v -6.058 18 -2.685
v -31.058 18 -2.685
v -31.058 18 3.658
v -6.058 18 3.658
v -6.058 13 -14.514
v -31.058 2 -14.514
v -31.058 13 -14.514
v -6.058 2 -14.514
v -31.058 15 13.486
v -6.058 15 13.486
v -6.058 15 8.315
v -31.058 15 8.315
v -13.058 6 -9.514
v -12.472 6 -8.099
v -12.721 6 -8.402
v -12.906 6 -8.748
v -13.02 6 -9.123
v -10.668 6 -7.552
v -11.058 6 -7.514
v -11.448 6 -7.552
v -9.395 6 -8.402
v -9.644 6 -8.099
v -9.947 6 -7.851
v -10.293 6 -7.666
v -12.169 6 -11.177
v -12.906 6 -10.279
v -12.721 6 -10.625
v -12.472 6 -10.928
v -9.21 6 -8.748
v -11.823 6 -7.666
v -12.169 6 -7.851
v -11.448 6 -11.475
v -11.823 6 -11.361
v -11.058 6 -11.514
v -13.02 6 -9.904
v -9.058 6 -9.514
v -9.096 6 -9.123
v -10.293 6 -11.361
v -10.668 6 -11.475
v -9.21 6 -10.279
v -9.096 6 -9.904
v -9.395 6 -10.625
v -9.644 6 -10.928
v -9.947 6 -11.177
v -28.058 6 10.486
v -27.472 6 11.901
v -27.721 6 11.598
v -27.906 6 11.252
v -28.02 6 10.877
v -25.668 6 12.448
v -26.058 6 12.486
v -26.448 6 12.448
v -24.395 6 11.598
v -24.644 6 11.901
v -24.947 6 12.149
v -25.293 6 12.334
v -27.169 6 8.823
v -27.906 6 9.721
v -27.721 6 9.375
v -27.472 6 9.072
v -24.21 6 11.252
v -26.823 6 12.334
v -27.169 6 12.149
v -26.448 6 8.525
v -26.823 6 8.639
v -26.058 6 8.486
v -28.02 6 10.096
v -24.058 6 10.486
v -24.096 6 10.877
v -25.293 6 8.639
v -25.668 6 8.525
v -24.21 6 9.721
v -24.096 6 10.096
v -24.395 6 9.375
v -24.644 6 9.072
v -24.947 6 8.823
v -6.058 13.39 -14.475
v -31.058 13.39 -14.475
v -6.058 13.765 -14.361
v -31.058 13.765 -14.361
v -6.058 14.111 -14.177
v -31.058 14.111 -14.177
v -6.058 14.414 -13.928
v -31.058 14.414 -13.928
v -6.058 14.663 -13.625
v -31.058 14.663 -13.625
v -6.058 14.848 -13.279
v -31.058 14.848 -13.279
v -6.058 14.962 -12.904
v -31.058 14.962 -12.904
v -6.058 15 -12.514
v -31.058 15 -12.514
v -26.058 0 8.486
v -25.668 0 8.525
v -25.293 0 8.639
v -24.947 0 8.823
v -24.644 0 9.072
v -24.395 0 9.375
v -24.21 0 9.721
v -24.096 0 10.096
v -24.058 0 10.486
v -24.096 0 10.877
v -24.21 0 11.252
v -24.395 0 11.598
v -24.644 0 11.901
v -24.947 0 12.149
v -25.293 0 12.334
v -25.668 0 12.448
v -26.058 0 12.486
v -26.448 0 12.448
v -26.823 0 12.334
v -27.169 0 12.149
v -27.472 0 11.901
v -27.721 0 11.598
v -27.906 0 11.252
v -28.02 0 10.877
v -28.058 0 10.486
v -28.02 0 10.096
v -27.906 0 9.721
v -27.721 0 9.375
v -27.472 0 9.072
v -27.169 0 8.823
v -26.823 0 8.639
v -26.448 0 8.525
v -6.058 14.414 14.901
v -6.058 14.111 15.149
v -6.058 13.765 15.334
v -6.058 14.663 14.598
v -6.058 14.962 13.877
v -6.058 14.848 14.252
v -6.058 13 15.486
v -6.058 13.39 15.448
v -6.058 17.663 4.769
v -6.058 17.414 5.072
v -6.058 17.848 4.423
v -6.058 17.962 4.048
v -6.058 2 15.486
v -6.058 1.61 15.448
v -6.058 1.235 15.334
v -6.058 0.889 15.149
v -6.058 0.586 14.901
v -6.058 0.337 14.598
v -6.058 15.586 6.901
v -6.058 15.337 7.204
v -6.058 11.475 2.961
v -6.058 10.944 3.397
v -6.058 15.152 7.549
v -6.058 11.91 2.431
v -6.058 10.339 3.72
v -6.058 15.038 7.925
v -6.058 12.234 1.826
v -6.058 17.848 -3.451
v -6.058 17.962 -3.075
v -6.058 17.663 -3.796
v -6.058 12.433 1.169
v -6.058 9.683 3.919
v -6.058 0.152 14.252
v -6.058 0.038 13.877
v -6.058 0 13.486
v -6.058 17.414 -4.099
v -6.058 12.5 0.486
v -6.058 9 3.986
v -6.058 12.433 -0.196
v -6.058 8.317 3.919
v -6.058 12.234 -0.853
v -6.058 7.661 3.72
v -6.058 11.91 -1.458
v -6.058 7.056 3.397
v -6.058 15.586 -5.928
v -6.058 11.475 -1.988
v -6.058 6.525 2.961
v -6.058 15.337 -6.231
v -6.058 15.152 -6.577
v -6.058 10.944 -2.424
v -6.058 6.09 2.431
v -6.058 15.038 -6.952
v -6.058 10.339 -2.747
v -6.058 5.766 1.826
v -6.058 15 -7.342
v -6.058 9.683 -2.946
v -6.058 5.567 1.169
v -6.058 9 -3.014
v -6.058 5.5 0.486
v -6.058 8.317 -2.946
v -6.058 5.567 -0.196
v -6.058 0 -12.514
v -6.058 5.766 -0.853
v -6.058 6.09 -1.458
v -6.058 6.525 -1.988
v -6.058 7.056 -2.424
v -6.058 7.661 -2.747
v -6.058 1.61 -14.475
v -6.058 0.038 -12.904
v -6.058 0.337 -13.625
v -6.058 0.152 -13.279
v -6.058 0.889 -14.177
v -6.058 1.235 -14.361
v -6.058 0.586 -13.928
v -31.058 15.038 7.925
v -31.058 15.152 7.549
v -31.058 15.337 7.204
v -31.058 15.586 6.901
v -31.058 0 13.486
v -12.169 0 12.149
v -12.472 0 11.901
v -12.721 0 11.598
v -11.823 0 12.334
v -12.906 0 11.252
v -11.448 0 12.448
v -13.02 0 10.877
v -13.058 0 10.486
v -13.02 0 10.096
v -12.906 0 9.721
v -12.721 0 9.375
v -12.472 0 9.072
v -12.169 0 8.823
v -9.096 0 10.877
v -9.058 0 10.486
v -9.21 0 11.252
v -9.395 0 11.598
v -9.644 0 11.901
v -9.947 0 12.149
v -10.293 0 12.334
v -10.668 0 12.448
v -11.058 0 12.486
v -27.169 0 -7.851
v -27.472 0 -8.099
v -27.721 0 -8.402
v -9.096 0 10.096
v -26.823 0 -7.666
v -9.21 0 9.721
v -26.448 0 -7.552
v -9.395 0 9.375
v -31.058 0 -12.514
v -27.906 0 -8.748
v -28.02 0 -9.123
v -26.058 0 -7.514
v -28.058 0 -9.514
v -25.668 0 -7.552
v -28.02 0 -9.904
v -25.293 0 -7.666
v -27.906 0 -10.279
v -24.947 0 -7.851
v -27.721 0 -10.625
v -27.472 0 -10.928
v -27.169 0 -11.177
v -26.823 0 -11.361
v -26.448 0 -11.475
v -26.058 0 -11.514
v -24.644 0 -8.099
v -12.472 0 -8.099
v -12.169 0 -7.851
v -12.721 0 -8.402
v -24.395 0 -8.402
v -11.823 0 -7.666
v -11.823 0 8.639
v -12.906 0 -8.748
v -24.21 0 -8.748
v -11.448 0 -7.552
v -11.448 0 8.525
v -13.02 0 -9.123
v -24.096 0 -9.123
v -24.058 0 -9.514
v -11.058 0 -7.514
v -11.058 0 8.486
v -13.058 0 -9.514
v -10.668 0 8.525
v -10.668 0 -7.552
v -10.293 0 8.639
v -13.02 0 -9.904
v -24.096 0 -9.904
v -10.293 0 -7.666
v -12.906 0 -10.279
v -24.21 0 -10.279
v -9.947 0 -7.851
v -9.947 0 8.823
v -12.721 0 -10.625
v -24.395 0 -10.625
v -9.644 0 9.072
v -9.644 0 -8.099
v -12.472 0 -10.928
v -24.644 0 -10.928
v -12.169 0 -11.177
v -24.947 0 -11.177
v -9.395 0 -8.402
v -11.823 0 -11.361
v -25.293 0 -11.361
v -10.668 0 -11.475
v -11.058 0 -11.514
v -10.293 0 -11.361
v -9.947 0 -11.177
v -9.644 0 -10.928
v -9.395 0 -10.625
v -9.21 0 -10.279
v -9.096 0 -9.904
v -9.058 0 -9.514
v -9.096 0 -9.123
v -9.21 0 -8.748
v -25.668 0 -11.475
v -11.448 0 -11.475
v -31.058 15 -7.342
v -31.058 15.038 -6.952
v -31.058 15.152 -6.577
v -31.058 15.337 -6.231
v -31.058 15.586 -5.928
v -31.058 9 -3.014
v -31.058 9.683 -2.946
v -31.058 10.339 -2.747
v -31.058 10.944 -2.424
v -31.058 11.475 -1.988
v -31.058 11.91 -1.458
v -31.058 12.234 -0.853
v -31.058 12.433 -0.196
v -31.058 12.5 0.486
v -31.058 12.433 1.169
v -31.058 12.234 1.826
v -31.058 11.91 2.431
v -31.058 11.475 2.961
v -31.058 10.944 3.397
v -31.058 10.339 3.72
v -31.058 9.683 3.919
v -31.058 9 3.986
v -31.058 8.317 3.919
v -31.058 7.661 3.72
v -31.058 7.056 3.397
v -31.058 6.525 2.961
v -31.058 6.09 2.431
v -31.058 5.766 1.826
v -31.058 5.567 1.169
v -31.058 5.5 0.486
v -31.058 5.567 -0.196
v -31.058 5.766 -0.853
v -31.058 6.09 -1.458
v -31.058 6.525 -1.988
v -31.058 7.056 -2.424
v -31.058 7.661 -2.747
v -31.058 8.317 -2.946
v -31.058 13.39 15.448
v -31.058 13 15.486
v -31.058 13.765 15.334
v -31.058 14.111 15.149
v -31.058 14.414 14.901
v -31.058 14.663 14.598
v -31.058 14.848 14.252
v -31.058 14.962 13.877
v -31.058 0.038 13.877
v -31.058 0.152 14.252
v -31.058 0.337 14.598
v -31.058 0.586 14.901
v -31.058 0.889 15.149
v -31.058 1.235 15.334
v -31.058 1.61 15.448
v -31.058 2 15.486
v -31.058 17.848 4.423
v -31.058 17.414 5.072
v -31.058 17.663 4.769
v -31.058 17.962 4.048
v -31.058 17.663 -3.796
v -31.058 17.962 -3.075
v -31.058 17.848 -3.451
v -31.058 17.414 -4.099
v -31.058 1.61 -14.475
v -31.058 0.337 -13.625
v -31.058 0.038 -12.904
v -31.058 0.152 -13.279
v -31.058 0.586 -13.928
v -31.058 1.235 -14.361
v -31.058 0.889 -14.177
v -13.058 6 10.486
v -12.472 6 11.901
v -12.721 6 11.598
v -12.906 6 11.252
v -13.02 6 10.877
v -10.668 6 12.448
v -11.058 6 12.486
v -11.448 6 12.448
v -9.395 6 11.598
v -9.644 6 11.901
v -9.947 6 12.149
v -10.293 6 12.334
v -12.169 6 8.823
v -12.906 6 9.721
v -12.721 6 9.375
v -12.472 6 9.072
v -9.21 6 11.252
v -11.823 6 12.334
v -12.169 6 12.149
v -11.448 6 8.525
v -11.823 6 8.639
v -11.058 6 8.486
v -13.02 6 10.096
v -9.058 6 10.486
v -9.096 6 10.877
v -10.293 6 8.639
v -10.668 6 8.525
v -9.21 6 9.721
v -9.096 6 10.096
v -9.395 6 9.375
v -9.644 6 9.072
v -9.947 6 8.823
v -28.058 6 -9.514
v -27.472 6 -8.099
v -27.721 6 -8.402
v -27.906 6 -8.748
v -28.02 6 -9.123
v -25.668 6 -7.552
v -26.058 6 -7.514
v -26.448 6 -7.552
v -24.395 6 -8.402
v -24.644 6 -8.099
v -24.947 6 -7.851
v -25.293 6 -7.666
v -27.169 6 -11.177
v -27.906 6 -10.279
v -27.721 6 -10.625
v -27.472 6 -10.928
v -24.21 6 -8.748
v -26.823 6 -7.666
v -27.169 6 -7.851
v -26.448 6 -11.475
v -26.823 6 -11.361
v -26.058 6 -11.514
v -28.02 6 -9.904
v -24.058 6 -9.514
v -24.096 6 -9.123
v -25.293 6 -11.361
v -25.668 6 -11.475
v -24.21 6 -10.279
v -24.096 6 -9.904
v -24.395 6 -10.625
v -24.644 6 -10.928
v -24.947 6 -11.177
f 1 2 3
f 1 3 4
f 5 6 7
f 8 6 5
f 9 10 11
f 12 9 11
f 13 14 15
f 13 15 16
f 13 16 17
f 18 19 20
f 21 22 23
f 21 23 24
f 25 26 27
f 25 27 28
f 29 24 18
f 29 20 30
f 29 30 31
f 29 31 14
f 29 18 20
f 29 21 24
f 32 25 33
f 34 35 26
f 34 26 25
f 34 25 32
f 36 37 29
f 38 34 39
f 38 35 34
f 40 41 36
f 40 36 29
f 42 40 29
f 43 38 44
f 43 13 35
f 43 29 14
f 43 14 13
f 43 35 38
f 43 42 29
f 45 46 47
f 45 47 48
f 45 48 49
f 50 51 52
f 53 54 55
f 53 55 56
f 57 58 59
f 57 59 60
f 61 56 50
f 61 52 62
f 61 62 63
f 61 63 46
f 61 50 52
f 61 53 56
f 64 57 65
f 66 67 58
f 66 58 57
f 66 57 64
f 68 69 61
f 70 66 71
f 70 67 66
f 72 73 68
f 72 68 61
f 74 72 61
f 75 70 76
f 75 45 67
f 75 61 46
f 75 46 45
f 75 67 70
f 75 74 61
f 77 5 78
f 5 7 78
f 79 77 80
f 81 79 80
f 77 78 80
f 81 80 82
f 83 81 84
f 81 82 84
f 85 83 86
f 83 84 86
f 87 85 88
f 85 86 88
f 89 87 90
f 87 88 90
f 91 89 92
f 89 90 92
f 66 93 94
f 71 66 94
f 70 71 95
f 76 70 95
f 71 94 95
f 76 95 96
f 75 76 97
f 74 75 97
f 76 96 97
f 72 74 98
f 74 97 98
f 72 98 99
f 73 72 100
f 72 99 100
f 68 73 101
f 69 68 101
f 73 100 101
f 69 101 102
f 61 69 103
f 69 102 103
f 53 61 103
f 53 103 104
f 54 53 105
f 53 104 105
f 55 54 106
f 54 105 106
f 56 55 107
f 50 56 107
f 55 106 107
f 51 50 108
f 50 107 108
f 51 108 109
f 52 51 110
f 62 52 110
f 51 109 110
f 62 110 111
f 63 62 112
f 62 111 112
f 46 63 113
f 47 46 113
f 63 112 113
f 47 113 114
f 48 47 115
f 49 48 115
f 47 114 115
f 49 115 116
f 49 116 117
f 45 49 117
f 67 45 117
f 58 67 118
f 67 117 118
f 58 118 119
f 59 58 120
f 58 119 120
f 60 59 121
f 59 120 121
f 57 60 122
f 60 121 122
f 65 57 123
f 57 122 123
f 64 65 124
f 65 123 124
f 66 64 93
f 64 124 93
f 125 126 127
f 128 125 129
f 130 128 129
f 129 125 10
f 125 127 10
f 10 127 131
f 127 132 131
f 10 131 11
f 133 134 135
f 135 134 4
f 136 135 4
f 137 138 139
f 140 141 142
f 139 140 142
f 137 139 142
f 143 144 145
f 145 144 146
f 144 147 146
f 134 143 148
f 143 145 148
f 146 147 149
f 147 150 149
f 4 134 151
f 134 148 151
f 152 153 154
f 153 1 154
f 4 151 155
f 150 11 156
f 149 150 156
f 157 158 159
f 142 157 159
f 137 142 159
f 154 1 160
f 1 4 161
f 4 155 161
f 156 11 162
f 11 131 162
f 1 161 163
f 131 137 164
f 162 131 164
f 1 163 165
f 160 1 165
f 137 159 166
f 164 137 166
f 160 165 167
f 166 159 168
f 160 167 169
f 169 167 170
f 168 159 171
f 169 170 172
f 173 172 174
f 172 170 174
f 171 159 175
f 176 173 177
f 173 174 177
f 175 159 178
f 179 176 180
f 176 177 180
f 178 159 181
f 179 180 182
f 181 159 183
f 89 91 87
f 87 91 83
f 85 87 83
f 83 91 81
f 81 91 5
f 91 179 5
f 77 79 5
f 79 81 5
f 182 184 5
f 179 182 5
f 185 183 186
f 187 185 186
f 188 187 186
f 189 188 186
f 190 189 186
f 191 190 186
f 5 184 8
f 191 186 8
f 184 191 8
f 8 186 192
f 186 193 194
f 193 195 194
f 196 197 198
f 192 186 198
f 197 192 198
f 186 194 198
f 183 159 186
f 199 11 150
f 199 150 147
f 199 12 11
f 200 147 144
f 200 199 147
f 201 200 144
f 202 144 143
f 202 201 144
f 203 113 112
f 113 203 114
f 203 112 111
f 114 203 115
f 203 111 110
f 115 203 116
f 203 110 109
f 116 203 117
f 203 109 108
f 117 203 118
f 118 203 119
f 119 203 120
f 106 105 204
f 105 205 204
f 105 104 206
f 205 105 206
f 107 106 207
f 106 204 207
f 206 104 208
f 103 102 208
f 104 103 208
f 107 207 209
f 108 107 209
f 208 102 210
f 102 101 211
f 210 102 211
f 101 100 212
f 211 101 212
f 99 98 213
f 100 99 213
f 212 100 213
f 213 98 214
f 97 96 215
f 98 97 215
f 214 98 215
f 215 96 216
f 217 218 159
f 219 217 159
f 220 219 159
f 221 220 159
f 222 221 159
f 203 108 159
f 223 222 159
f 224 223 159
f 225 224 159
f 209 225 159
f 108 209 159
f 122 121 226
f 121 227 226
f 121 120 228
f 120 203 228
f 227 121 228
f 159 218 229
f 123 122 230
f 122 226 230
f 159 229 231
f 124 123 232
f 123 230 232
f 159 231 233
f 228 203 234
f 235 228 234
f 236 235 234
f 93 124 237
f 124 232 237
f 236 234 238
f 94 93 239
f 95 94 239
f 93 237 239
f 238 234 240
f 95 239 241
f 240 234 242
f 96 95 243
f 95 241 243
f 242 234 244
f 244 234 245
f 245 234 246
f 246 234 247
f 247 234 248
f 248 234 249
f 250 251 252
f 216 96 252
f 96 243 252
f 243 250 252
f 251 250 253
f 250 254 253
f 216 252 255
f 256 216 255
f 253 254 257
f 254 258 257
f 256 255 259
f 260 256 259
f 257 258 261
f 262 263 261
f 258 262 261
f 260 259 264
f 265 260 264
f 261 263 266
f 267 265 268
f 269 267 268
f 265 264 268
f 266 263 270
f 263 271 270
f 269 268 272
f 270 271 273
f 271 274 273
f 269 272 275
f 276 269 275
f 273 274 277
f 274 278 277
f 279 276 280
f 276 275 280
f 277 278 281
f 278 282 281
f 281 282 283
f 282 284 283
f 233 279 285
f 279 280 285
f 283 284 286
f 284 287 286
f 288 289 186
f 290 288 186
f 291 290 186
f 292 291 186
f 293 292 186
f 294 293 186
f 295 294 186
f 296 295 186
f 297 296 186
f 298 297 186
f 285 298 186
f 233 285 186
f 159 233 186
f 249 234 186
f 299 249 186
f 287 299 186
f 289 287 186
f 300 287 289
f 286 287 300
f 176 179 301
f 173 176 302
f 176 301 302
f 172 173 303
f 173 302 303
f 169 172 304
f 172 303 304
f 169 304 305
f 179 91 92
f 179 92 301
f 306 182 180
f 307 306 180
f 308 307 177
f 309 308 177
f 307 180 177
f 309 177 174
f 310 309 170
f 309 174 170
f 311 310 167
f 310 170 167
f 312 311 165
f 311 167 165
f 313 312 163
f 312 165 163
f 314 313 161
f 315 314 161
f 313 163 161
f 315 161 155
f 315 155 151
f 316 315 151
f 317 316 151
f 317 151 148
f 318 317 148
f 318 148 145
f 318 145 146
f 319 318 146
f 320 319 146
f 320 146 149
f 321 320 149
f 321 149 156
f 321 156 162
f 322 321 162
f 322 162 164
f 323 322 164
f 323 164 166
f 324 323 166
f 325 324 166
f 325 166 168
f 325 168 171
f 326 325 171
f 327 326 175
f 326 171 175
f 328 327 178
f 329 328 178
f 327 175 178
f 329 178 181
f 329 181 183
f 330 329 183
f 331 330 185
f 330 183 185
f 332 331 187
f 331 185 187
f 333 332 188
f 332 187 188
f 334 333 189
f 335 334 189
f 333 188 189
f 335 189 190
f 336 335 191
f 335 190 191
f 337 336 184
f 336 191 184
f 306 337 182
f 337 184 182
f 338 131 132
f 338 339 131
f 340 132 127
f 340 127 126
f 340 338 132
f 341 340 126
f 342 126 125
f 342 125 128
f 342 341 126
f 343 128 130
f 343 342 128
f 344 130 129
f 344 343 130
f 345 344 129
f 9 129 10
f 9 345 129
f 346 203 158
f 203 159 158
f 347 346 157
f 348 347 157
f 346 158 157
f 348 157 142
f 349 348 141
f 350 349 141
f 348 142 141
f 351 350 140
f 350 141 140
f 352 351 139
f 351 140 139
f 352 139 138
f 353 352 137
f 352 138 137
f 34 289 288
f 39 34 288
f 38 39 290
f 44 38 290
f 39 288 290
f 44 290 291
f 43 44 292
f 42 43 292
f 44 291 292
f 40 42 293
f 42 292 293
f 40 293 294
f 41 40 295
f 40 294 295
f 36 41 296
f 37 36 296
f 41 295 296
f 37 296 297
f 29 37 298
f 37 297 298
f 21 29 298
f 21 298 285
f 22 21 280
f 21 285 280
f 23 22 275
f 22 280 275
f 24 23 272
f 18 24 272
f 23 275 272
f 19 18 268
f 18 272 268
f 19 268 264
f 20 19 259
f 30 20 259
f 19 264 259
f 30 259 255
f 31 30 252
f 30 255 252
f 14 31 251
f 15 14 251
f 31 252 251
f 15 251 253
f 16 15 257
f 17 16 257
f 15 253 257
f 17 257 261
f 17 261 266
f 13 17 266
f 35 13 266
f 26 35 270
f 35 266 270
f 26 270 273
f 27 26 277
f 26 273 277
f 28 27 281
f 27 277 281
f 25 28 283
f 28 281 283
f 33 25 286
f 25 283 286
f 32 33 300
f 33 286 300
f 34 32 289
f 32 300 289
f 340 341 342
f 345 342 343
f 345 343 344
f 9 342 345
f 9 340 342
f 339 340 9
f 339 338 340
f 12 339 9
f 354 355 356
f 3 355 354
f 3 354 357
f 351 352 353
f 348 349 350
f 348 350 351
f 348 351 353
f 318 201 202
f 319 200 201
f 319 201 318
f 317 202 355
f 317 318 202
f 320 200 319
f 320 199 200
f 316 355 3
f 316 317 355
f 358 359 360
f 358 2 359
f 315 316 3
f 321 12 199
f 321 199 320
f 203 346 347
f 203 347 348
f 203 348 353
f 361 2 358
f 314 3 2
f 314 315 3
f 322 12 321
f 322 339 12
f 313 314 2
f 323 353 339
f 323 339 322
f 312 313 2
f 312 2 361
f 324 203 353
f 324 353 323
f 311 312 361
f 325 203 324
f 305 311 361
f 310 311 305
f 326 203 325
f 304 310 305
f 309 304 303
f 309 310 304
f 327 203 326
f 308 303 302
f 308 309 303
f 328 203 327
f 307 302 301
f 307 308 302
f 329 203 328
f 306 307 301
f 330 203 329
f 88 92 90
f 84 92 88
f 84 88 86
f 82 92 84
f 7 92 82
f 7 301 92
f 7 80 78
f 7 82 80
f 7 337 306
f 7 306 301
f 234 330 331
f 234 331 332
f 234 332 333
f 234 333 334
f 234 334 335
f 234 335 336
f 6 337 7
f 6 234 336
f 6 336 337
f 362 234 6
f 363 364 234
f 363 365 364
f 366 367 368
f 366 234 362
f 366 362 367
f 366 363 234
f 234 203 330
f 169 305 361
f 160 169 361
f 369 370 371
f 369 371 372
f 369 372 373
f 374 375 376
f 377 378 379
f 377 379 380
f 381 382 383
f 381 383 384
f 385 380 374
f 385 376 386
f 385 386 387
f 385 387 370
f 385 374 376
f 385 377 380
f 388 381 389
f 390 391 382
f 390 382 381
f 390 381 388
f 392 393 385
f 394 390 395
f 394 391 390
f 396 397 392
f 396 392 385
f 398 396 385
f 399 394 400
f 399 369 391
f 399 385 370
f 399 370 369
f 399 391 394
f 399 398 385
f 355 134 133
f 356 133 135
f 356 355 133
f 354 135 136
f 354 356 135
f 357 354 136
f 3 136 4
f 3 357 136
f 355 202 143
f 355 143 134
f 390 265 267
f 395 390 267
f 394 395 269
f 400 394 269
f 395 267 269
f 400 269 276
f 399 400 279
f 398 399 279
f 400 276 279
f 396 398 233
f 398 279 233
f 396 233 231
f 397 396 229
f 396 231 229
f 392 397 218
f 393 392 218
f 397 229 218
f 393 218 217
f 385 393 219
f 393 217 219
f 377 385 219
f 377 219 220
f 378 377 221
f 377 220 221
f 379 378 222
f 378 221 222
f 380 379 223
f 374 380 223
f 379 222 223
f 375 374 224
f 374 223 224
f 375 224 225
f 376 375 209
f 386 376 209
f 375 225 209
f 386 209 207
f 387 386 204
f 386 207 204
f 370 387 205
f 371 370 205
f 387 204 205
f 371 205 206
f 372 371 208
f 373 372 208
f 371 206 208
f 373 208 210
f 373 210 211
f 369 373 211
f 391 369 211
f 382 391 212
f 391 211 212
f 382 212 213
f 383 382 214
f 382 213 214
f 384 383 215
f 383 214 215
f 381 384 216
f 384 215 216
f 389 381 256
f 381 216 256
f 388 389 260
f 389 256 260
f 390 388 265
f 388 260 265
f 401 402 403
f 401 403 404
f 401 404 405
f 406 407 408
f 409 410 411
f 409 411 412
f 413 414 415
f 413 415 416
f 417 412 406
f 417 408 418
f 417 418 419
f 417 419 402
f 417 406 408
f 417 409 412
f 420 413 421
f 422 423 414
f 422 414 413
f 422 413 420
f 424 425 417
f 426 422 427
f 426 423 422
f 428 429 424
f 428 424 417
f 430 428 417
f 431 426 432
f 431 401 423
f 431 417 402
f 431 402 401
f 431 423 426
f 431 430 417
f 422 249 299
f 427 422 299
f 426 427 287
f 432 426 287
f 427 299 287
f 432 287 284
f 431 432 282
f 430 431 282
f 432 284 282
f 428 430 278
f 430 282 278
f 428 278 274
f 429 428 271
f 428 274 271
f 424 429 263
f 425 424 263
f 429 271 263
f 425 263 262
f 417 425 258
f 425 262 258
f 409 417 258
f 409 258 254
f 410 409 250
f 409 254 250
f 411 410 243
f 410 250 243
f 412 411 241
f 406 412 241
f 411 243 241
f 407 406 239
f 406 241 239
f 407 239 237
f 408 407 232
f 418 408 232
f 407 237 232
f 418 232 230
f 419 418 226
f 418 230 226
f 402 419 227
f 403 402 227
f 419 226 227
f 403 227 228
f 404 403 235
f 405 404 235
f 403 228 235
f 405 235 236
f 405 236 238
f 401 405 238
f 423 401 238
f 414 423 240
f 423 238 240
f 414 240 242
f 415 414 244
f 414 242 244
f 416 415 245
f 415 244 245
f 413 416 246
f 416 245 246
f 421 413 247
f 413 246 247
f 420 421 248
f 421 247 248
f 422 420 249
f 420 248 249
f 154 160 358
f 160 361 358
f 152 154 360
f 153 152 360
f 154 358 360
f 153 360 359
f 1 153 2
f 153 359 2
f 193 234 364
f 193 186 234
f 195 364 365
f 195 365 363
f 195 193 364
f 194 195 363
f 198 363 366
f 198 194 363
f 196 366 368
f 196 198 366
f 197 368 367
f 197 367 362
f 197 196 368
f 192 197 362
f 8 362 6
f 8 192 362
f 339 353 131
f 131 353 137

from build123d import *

# Parameters (mm, degrees)
SKETCH_1_W          = 25
SKETCH_1_H          = 30
EXTRUDE_2_DEPTH     = 18
CUT_EXTRUDE_1_DEPTH = 33
CUT_EXTRUDE_2_DEPTH = 33
SKETCH_6_R          = 3.5
CUT_EXTRUDE_3_DEPTH = 33
SKETCH_8_R          = 2
CUT_EXTRUDE_4_DEPTH = 6
FILLET_2_R          = 2


with BuildPart() as part:
    # 草图1 → 凸台-拉伸2 (new body)
    with BuildSketch(Plane(origin=(0, 0, 0), x_dir=(1, 0, 0), z_dir=(0, 1, 0))):
        with Locations((-18.558036971, -0.486406136)):
            Rectangle(SKETCH_1_W, SKETCH_1_H)
    extrude(amount=EXTRUDE_2_DEPTH)

    # 草图3 → 切除-拉伸1 (cut)
    with BuildSketch(Plane(origin=(-6.058036971, 0, 0), x_dir=(0, 0, -1), z_dir=(1, 0, 0))):
        Polygon((-15.486406136, 15), (-7.486406136, 15), (-4.486406136, 18), (-15.486406136, 18), align=None)
    extrude(amount=-CUT_EXTRUDE_1_DEPTH, mode=Mode.SUBTRACT)

    # 草图5 → 切除-拉伸2 (cut)
    with BuildSketch(Plane(origin=(-6.058036971, 0, 0), x_dir=(0, 0, -1), z_dir=(1, 0, 0))):
        Polygon((14.513593864, 18), (14.513593864, 15), (6.513593864, 15), (3.513593864, 18), align=None)
    extrude(amount=-CUT_EXTRUDE_2_DEPTH, mode=Mode.SUBTRACT)

    # 草图6 → 切除-拉伸3 (cut)
    with BuildSketch(Plane(origin=(-6.058036971, 0, 0), x_dir=(0, 0, -1), z_dir=(1, 0, 0))):
        with Locations((-0.486406136, 9)):
            Circle(SKETCH_6_R)
    extrude(amount=-CUT_EXTRUDE_3_DEPTH, mode=Mode.SUBTRACT)

    # 草图8 → 切除-拉伸4 (cut)
    with BuildSketch(Plane.XZ):
        with Locations(Location((-11.058036971, 10.486406136, 0), (0, 0, 270))):
            Circle(SKETCH_8_R)
        with Locations(Location((-11.058036971, -9.513593864, 0), (0, 0, 270))):
            Circle(SKETCH_8_R)
        with Locations(Location((-26.058036971, 10.486406136, 0), (0, 0, 270))):
            Circle(SKETCH_8_R)
        with Locations(Location((-26.058036971, -9.513593864, 0), (0, 0, 270))):
            Circle(SKETCH_8_R)
    extrude(amount=-CUT_EXTRUDE_4_DEPTH, mode=Mode.SUBTRACT)

    # 圆角2
    fillet_2_edges = [part.edges().sort_by_distance(p)[0] for p in [
        (-18.558036971, 18, 4.486406136),
        (-18.558036971, 15, 7.486406136),
        (-18.558036971, 15, 15.486406136),
        (-18.558036971, 18, -3.513593864),
        (-18.558036971, 15, -14.513593864),
        (-18.558036971, 15, -6.513593864),
        (-18.558036971, 0, -14.513593864),
        (-18.558036971, 0, 15.486406136),
    ]]
    fillet(fillet_2_edges, radius=FILLET_2_R)


solid = part.part
